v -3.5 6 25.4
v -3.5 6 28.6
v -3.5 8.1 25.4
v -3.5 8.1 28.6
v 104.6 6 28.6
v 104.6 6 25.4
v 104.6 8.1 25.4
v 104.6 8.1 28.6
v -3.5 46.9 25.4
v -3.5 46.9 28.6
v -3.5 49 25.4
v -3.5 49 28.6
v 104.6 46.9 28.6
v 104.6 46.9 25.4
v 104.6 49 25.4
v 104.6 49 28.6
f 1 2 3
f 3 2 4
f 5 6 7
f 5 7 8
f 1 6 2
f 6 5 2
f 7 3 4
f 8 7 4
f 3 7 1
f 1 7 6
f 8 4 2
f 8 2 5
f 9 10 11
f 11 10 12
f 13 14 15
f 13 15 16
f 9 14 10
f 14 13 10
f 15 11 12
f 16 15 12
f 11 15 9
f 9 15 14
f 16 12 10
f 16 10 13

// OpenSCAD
// Generated by the canonical parent Python sources and validated exchange pipeline.
polyhedron(points=[[-3.5, 6.0, 25.399999618530273], [-3.5, 6.0, 28.600000381469727], [-3.5, 8.100000381469727, 25.399999618530273], [-3.5, 8.100000381469727, 28.600000381469727], [104.5999984741211, 6.0, 28.600000381469727], [104.5999984741211, 6.0, 25.399999618530273], [104.5999984741211, 8.100000381469727, 25.399999618530273], [104.5999984741211, 8.100000381469727, 28.600000381469727], [-3.5, 46.900001525878906, 25.399999618530273], [-3.5, 46.900001525878906, 28.600000381469727], [-3.5, 49.0, 25.399999618530273], [-3.5, 49.0, 28.600000381469727], [104.5999984741211, 46.900001525878906, 28.600000381469727], [104.5999984741211, 46.900001525878906, 25.399999618530273], [104.5999984741211, 49.0, 25.399999618530273], [104.5999984741211, 49.0, 28.600000381469727]],faces=[[2, 1, 0], [3, 1, 2], [6, 5, 4], [7, 6, 4], [1, 5, 0], [1, 4, 5], [3, 2, 6], [3, 6, 7], [0, 6, 2], [5, 6, 0], [1, 3, 7], [4, 1, 7], [10, 9, 8], [11, 9, 10], [14, 13, 12], [15, 14, 12], [9, 13, 8], [9, 12, 13], [11, 10, 14], [11, 14, 15], [8, 14, 10], [13, 14, 8], [9, 11, 15], [12, 9, 15]],convexity=10);
